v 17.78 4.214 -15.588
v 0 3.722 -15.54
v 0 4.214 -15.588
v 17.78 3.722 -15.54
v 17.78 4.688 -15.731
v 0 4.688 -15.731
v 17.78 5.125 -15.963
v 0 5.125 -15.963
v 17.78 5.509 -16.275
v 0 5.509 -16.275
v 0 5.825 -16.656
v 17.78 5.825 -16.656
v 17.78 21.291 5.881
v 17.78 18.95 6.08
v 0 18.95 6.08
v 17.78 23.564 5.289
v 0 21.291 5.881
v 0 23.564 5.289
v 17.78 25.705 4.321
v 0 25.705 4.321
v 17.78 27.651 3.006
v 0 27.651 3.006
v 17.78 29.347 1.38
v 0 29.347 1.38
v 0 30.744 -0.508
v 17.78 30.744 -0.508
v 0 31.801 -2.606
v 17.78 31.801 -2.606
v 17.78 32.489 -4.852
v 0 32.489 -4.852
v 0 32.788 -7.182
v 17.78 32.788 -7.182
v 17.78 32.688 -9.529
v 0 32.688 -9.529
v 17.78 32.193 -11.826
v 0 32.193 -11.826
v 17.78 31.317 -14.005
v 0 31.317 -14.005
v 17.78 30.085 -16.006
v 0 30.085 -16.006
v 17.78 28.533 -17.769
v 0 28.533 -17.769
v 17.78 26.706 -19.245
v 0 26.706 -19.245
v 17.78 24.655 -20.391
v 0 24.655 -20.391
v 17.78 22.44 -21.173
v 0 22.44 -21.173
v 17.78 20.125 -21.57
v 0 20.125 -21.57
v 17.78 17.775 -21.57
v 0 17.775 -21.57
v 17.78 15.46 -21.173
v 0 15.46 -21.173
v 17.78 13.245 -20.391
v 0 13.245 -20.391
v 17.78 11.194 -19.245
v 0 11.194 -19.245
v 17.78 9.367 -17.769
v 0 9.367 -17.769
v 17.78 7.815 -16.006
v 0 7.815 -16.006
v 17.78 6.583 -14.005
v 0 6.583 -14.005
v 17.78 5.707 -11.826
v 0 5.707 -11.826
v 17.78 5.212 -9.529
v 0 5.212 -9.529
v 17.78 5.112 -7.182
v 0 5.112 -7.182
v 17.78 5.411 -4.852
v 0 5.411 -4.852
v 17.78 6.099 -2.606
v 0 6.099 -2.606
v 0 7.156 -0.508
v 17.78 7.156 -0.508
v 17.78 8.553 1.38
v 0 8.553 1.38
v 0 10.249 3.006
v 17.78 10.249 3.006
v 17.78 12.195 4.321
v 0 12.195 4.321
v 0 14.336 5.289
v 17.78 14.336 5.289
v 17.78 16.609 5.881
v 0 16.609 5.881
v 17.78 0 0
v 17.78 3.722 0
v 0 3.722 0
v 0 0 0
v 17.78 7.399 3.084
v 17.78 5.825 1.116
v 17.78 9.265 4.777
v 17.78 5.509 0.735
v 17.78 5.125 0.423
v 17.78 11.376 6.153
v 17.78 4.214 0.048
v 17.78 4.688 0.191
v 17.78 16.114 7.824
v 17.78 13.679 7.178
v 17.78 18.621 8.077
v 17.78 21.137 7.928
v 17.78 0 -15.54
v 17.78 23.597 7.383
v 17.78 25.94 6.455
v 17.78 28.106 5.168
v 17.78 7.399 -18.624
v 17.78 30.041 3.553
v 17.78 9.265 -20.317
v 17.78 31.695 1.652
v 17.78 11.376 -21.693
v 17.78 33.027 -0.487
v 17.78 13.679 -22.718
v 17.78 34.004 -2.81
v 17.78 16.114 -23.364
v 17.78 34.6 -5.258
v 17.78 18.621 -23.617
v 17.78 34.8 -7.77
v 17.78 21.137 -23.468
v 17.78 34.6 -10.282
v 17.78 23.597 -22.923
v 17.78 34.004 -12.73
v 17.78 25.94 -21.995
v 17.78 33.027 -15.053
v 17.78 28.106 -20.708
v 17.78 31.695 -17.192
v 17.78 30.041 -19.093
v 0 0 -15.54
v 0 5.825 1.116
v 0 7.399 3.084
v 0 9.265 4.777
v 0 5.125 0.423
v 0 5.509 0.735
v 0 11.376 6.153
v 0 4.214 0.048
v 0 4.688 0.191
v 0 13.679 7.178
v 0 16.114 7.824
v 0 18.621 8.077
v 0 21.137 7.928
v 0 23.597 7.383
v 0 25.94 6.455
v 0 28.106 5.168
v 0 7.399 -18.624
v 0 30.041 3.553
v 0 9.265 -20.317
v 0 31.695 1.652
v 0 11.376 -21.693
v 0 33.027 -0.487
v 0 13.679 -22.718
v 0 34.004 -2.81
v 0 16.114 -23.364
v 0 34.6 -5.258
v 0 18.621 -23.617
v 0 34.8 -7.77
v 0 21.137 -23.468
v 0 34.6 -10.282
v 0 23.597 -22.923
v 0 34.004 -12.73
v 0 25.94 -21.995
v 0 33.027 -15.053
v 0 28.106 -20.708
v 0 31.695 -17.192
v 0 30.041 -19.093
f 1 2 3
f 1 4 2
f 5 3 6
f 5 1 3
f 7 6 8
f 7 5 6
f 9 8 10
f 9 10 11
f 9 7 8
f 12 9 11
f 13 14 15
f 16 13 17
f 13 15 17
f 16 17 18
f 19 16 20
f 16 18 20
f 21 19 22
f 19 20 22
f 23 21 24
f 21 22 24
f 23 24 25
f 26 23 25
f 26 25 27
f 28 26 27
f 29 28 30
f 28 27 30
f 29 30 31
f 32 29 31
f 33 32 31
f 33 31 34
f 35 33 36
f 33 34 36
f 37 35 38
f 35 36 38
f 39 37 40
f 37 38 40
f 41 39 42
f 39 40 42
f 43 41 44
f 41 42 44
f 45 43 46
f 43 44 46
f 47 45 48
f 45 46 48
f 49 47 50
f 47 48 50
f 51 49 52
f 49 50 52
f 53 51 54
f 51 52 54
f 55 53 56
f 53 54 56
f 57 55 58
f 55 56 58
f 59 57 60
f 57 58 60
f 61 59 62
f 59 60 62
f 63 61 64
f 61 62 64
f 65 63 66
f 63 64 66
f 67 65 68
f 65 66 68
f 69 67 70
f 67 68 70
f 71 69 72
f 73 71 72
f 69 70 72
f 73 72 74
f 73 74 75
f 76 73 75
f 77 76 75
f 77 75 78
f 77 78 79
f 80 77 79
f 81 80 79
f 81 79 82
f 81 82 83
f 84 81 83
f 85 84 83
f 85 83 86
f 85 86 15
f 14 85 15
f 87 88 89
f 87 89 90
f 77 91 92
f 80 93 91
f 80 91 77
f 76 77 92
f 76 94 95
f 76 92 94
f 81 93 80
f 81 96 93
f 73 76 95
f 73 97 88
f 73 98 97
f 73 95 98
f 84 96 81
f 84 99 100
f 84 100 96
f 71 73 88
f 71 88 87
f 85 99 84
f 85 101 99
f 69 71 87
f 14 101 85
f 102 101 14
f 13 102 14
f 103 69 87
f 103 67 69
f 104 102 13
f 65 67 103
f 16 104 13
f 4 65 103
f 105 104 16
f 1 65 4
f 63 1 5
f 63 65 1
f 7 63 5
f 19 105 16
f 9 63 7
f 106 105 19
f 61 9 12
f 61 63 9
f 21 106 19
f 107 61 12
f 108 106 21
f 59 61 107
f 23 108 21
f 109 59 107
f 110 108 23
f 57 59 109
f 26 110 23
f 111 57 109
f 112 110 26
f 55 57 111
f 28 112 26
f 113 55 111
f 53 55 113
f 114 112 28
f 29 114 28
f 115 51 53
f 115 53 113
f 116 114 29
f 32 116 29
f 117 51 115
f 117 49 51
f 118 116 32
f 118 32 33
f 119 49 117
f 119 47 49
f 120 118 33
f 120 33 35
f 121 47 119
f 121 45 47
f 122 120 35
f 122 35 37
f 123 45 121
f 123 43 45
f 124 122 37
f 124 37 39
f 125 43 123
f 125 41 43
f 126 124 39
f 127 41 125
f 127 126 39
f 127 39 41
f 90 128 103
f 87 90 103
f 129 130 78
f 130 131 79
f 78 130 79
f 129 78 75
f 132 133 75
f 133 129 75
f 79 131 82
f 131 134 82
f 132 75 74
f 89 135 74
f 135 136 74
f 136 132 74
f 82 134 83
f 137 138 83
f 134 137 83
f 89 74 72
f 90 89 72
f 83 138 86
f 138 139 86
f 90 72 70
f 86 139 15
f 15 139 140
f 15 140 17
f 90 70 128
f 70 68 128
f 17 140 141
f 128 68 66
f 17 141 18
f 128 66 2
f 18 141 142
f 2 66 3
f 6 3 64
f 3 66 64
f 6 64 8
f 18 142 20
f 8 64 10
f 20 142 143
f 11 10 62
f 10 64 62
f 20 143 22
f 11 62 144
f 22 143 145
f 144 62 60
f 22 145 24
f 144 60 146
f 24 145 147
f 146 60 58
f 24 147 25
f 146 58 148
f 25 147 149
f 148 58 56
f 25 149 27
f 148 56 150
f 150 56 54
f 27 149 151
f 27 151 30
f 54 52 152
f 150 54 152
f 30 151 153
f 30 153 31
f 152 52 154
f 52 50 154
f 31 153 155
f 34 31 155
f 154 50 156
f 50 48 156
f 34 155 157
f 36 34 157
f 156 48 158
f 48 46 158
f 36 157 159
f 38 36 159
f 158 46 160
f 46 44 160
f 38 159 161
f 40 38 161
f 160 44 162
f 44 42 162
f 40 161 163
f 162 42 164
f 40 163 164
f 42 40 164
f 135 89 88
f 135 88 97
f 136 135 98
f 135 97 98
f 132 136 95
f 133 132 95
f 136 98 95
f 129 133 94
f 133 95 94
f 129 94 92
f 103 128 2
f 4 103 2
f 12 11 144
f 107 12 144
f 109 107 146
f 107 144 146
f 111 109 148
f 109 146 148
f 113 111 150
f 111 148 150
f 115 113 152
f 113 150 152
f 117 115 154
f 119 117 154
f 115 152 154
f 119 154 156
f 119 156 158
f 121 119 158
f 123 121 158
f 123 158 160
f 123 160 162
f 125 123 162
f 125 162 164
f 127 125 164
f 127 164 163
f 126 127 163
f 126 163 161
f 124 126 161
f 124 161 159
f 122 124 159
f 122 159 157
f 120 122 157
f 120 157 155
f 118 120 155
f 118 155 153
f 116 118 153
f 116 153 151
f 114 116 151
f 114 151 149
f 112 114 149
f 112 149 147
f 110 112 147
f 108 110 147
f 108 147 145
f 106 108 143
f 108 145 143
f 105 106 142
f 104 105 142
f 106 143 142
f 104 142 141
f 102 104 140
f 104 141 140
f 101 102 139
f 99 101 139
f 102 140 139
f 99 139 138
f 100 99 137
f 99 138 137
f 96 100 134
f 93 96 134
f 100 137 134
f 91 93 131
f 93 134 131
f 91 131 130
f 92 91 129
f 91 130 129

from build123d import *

# Parameters (mm, degrees)
SKETCH1_W           = 17.78
SKETCH1_H           = 15.54
BOSS_EXTRUDE1_DEPTH = 3.1
SKETCH3_R           = 13.85
BOSS_EXTRUDE2_DEPTH = 17.78
FILLET1_R           = 2.54


with BuildPart() as part:
    # Sketch1 → Boss-Extrude1 (new body)
    with BuildSketch(Plane(origin=(0, 0, 0), x_dir=(1, 0, 0), z_dir=(0, 1, 0))):
        with Locations((8.89, 7.77)):
            Rectangle(SKETCH1_W, SKETCH1_H)
    extrude(amount=BOSS_EXTRUDE1_DEPTH)

    # Sketch3 → Boss-Extrude2 (add)
    with BuildSketch(Plane.ZY):
        with BuildLine():
            Line((-15.54, 3.1), (-15.54, 5.135167392))
            ThreePointArc((-15.54, 5.135167392), (-7.77, 34.8), (0, 5.135167392))
            Line((0, 5.135167392), (0, 3.1))
            Line((0, 3.1), (-15.54, 3.1))
        make_face()
        with Locations((-7.77, 18.95)):
            Circle(SKETCH3_R, mode=Mode.SUBTRACT)
    extrude(amount=-BOSS_EXTRUDE2_DEPTH)

    # Fillet1
    fillet1_edges = [part.edges().sort_by_distance(p)[0] for p in [
        (8.89, 5.135167392, 0),
        (8.89, 5.135167392, -15.54),
    ]]
    fillet(fillet1_edges, radius=FILLET1_R)


solid = part.part
